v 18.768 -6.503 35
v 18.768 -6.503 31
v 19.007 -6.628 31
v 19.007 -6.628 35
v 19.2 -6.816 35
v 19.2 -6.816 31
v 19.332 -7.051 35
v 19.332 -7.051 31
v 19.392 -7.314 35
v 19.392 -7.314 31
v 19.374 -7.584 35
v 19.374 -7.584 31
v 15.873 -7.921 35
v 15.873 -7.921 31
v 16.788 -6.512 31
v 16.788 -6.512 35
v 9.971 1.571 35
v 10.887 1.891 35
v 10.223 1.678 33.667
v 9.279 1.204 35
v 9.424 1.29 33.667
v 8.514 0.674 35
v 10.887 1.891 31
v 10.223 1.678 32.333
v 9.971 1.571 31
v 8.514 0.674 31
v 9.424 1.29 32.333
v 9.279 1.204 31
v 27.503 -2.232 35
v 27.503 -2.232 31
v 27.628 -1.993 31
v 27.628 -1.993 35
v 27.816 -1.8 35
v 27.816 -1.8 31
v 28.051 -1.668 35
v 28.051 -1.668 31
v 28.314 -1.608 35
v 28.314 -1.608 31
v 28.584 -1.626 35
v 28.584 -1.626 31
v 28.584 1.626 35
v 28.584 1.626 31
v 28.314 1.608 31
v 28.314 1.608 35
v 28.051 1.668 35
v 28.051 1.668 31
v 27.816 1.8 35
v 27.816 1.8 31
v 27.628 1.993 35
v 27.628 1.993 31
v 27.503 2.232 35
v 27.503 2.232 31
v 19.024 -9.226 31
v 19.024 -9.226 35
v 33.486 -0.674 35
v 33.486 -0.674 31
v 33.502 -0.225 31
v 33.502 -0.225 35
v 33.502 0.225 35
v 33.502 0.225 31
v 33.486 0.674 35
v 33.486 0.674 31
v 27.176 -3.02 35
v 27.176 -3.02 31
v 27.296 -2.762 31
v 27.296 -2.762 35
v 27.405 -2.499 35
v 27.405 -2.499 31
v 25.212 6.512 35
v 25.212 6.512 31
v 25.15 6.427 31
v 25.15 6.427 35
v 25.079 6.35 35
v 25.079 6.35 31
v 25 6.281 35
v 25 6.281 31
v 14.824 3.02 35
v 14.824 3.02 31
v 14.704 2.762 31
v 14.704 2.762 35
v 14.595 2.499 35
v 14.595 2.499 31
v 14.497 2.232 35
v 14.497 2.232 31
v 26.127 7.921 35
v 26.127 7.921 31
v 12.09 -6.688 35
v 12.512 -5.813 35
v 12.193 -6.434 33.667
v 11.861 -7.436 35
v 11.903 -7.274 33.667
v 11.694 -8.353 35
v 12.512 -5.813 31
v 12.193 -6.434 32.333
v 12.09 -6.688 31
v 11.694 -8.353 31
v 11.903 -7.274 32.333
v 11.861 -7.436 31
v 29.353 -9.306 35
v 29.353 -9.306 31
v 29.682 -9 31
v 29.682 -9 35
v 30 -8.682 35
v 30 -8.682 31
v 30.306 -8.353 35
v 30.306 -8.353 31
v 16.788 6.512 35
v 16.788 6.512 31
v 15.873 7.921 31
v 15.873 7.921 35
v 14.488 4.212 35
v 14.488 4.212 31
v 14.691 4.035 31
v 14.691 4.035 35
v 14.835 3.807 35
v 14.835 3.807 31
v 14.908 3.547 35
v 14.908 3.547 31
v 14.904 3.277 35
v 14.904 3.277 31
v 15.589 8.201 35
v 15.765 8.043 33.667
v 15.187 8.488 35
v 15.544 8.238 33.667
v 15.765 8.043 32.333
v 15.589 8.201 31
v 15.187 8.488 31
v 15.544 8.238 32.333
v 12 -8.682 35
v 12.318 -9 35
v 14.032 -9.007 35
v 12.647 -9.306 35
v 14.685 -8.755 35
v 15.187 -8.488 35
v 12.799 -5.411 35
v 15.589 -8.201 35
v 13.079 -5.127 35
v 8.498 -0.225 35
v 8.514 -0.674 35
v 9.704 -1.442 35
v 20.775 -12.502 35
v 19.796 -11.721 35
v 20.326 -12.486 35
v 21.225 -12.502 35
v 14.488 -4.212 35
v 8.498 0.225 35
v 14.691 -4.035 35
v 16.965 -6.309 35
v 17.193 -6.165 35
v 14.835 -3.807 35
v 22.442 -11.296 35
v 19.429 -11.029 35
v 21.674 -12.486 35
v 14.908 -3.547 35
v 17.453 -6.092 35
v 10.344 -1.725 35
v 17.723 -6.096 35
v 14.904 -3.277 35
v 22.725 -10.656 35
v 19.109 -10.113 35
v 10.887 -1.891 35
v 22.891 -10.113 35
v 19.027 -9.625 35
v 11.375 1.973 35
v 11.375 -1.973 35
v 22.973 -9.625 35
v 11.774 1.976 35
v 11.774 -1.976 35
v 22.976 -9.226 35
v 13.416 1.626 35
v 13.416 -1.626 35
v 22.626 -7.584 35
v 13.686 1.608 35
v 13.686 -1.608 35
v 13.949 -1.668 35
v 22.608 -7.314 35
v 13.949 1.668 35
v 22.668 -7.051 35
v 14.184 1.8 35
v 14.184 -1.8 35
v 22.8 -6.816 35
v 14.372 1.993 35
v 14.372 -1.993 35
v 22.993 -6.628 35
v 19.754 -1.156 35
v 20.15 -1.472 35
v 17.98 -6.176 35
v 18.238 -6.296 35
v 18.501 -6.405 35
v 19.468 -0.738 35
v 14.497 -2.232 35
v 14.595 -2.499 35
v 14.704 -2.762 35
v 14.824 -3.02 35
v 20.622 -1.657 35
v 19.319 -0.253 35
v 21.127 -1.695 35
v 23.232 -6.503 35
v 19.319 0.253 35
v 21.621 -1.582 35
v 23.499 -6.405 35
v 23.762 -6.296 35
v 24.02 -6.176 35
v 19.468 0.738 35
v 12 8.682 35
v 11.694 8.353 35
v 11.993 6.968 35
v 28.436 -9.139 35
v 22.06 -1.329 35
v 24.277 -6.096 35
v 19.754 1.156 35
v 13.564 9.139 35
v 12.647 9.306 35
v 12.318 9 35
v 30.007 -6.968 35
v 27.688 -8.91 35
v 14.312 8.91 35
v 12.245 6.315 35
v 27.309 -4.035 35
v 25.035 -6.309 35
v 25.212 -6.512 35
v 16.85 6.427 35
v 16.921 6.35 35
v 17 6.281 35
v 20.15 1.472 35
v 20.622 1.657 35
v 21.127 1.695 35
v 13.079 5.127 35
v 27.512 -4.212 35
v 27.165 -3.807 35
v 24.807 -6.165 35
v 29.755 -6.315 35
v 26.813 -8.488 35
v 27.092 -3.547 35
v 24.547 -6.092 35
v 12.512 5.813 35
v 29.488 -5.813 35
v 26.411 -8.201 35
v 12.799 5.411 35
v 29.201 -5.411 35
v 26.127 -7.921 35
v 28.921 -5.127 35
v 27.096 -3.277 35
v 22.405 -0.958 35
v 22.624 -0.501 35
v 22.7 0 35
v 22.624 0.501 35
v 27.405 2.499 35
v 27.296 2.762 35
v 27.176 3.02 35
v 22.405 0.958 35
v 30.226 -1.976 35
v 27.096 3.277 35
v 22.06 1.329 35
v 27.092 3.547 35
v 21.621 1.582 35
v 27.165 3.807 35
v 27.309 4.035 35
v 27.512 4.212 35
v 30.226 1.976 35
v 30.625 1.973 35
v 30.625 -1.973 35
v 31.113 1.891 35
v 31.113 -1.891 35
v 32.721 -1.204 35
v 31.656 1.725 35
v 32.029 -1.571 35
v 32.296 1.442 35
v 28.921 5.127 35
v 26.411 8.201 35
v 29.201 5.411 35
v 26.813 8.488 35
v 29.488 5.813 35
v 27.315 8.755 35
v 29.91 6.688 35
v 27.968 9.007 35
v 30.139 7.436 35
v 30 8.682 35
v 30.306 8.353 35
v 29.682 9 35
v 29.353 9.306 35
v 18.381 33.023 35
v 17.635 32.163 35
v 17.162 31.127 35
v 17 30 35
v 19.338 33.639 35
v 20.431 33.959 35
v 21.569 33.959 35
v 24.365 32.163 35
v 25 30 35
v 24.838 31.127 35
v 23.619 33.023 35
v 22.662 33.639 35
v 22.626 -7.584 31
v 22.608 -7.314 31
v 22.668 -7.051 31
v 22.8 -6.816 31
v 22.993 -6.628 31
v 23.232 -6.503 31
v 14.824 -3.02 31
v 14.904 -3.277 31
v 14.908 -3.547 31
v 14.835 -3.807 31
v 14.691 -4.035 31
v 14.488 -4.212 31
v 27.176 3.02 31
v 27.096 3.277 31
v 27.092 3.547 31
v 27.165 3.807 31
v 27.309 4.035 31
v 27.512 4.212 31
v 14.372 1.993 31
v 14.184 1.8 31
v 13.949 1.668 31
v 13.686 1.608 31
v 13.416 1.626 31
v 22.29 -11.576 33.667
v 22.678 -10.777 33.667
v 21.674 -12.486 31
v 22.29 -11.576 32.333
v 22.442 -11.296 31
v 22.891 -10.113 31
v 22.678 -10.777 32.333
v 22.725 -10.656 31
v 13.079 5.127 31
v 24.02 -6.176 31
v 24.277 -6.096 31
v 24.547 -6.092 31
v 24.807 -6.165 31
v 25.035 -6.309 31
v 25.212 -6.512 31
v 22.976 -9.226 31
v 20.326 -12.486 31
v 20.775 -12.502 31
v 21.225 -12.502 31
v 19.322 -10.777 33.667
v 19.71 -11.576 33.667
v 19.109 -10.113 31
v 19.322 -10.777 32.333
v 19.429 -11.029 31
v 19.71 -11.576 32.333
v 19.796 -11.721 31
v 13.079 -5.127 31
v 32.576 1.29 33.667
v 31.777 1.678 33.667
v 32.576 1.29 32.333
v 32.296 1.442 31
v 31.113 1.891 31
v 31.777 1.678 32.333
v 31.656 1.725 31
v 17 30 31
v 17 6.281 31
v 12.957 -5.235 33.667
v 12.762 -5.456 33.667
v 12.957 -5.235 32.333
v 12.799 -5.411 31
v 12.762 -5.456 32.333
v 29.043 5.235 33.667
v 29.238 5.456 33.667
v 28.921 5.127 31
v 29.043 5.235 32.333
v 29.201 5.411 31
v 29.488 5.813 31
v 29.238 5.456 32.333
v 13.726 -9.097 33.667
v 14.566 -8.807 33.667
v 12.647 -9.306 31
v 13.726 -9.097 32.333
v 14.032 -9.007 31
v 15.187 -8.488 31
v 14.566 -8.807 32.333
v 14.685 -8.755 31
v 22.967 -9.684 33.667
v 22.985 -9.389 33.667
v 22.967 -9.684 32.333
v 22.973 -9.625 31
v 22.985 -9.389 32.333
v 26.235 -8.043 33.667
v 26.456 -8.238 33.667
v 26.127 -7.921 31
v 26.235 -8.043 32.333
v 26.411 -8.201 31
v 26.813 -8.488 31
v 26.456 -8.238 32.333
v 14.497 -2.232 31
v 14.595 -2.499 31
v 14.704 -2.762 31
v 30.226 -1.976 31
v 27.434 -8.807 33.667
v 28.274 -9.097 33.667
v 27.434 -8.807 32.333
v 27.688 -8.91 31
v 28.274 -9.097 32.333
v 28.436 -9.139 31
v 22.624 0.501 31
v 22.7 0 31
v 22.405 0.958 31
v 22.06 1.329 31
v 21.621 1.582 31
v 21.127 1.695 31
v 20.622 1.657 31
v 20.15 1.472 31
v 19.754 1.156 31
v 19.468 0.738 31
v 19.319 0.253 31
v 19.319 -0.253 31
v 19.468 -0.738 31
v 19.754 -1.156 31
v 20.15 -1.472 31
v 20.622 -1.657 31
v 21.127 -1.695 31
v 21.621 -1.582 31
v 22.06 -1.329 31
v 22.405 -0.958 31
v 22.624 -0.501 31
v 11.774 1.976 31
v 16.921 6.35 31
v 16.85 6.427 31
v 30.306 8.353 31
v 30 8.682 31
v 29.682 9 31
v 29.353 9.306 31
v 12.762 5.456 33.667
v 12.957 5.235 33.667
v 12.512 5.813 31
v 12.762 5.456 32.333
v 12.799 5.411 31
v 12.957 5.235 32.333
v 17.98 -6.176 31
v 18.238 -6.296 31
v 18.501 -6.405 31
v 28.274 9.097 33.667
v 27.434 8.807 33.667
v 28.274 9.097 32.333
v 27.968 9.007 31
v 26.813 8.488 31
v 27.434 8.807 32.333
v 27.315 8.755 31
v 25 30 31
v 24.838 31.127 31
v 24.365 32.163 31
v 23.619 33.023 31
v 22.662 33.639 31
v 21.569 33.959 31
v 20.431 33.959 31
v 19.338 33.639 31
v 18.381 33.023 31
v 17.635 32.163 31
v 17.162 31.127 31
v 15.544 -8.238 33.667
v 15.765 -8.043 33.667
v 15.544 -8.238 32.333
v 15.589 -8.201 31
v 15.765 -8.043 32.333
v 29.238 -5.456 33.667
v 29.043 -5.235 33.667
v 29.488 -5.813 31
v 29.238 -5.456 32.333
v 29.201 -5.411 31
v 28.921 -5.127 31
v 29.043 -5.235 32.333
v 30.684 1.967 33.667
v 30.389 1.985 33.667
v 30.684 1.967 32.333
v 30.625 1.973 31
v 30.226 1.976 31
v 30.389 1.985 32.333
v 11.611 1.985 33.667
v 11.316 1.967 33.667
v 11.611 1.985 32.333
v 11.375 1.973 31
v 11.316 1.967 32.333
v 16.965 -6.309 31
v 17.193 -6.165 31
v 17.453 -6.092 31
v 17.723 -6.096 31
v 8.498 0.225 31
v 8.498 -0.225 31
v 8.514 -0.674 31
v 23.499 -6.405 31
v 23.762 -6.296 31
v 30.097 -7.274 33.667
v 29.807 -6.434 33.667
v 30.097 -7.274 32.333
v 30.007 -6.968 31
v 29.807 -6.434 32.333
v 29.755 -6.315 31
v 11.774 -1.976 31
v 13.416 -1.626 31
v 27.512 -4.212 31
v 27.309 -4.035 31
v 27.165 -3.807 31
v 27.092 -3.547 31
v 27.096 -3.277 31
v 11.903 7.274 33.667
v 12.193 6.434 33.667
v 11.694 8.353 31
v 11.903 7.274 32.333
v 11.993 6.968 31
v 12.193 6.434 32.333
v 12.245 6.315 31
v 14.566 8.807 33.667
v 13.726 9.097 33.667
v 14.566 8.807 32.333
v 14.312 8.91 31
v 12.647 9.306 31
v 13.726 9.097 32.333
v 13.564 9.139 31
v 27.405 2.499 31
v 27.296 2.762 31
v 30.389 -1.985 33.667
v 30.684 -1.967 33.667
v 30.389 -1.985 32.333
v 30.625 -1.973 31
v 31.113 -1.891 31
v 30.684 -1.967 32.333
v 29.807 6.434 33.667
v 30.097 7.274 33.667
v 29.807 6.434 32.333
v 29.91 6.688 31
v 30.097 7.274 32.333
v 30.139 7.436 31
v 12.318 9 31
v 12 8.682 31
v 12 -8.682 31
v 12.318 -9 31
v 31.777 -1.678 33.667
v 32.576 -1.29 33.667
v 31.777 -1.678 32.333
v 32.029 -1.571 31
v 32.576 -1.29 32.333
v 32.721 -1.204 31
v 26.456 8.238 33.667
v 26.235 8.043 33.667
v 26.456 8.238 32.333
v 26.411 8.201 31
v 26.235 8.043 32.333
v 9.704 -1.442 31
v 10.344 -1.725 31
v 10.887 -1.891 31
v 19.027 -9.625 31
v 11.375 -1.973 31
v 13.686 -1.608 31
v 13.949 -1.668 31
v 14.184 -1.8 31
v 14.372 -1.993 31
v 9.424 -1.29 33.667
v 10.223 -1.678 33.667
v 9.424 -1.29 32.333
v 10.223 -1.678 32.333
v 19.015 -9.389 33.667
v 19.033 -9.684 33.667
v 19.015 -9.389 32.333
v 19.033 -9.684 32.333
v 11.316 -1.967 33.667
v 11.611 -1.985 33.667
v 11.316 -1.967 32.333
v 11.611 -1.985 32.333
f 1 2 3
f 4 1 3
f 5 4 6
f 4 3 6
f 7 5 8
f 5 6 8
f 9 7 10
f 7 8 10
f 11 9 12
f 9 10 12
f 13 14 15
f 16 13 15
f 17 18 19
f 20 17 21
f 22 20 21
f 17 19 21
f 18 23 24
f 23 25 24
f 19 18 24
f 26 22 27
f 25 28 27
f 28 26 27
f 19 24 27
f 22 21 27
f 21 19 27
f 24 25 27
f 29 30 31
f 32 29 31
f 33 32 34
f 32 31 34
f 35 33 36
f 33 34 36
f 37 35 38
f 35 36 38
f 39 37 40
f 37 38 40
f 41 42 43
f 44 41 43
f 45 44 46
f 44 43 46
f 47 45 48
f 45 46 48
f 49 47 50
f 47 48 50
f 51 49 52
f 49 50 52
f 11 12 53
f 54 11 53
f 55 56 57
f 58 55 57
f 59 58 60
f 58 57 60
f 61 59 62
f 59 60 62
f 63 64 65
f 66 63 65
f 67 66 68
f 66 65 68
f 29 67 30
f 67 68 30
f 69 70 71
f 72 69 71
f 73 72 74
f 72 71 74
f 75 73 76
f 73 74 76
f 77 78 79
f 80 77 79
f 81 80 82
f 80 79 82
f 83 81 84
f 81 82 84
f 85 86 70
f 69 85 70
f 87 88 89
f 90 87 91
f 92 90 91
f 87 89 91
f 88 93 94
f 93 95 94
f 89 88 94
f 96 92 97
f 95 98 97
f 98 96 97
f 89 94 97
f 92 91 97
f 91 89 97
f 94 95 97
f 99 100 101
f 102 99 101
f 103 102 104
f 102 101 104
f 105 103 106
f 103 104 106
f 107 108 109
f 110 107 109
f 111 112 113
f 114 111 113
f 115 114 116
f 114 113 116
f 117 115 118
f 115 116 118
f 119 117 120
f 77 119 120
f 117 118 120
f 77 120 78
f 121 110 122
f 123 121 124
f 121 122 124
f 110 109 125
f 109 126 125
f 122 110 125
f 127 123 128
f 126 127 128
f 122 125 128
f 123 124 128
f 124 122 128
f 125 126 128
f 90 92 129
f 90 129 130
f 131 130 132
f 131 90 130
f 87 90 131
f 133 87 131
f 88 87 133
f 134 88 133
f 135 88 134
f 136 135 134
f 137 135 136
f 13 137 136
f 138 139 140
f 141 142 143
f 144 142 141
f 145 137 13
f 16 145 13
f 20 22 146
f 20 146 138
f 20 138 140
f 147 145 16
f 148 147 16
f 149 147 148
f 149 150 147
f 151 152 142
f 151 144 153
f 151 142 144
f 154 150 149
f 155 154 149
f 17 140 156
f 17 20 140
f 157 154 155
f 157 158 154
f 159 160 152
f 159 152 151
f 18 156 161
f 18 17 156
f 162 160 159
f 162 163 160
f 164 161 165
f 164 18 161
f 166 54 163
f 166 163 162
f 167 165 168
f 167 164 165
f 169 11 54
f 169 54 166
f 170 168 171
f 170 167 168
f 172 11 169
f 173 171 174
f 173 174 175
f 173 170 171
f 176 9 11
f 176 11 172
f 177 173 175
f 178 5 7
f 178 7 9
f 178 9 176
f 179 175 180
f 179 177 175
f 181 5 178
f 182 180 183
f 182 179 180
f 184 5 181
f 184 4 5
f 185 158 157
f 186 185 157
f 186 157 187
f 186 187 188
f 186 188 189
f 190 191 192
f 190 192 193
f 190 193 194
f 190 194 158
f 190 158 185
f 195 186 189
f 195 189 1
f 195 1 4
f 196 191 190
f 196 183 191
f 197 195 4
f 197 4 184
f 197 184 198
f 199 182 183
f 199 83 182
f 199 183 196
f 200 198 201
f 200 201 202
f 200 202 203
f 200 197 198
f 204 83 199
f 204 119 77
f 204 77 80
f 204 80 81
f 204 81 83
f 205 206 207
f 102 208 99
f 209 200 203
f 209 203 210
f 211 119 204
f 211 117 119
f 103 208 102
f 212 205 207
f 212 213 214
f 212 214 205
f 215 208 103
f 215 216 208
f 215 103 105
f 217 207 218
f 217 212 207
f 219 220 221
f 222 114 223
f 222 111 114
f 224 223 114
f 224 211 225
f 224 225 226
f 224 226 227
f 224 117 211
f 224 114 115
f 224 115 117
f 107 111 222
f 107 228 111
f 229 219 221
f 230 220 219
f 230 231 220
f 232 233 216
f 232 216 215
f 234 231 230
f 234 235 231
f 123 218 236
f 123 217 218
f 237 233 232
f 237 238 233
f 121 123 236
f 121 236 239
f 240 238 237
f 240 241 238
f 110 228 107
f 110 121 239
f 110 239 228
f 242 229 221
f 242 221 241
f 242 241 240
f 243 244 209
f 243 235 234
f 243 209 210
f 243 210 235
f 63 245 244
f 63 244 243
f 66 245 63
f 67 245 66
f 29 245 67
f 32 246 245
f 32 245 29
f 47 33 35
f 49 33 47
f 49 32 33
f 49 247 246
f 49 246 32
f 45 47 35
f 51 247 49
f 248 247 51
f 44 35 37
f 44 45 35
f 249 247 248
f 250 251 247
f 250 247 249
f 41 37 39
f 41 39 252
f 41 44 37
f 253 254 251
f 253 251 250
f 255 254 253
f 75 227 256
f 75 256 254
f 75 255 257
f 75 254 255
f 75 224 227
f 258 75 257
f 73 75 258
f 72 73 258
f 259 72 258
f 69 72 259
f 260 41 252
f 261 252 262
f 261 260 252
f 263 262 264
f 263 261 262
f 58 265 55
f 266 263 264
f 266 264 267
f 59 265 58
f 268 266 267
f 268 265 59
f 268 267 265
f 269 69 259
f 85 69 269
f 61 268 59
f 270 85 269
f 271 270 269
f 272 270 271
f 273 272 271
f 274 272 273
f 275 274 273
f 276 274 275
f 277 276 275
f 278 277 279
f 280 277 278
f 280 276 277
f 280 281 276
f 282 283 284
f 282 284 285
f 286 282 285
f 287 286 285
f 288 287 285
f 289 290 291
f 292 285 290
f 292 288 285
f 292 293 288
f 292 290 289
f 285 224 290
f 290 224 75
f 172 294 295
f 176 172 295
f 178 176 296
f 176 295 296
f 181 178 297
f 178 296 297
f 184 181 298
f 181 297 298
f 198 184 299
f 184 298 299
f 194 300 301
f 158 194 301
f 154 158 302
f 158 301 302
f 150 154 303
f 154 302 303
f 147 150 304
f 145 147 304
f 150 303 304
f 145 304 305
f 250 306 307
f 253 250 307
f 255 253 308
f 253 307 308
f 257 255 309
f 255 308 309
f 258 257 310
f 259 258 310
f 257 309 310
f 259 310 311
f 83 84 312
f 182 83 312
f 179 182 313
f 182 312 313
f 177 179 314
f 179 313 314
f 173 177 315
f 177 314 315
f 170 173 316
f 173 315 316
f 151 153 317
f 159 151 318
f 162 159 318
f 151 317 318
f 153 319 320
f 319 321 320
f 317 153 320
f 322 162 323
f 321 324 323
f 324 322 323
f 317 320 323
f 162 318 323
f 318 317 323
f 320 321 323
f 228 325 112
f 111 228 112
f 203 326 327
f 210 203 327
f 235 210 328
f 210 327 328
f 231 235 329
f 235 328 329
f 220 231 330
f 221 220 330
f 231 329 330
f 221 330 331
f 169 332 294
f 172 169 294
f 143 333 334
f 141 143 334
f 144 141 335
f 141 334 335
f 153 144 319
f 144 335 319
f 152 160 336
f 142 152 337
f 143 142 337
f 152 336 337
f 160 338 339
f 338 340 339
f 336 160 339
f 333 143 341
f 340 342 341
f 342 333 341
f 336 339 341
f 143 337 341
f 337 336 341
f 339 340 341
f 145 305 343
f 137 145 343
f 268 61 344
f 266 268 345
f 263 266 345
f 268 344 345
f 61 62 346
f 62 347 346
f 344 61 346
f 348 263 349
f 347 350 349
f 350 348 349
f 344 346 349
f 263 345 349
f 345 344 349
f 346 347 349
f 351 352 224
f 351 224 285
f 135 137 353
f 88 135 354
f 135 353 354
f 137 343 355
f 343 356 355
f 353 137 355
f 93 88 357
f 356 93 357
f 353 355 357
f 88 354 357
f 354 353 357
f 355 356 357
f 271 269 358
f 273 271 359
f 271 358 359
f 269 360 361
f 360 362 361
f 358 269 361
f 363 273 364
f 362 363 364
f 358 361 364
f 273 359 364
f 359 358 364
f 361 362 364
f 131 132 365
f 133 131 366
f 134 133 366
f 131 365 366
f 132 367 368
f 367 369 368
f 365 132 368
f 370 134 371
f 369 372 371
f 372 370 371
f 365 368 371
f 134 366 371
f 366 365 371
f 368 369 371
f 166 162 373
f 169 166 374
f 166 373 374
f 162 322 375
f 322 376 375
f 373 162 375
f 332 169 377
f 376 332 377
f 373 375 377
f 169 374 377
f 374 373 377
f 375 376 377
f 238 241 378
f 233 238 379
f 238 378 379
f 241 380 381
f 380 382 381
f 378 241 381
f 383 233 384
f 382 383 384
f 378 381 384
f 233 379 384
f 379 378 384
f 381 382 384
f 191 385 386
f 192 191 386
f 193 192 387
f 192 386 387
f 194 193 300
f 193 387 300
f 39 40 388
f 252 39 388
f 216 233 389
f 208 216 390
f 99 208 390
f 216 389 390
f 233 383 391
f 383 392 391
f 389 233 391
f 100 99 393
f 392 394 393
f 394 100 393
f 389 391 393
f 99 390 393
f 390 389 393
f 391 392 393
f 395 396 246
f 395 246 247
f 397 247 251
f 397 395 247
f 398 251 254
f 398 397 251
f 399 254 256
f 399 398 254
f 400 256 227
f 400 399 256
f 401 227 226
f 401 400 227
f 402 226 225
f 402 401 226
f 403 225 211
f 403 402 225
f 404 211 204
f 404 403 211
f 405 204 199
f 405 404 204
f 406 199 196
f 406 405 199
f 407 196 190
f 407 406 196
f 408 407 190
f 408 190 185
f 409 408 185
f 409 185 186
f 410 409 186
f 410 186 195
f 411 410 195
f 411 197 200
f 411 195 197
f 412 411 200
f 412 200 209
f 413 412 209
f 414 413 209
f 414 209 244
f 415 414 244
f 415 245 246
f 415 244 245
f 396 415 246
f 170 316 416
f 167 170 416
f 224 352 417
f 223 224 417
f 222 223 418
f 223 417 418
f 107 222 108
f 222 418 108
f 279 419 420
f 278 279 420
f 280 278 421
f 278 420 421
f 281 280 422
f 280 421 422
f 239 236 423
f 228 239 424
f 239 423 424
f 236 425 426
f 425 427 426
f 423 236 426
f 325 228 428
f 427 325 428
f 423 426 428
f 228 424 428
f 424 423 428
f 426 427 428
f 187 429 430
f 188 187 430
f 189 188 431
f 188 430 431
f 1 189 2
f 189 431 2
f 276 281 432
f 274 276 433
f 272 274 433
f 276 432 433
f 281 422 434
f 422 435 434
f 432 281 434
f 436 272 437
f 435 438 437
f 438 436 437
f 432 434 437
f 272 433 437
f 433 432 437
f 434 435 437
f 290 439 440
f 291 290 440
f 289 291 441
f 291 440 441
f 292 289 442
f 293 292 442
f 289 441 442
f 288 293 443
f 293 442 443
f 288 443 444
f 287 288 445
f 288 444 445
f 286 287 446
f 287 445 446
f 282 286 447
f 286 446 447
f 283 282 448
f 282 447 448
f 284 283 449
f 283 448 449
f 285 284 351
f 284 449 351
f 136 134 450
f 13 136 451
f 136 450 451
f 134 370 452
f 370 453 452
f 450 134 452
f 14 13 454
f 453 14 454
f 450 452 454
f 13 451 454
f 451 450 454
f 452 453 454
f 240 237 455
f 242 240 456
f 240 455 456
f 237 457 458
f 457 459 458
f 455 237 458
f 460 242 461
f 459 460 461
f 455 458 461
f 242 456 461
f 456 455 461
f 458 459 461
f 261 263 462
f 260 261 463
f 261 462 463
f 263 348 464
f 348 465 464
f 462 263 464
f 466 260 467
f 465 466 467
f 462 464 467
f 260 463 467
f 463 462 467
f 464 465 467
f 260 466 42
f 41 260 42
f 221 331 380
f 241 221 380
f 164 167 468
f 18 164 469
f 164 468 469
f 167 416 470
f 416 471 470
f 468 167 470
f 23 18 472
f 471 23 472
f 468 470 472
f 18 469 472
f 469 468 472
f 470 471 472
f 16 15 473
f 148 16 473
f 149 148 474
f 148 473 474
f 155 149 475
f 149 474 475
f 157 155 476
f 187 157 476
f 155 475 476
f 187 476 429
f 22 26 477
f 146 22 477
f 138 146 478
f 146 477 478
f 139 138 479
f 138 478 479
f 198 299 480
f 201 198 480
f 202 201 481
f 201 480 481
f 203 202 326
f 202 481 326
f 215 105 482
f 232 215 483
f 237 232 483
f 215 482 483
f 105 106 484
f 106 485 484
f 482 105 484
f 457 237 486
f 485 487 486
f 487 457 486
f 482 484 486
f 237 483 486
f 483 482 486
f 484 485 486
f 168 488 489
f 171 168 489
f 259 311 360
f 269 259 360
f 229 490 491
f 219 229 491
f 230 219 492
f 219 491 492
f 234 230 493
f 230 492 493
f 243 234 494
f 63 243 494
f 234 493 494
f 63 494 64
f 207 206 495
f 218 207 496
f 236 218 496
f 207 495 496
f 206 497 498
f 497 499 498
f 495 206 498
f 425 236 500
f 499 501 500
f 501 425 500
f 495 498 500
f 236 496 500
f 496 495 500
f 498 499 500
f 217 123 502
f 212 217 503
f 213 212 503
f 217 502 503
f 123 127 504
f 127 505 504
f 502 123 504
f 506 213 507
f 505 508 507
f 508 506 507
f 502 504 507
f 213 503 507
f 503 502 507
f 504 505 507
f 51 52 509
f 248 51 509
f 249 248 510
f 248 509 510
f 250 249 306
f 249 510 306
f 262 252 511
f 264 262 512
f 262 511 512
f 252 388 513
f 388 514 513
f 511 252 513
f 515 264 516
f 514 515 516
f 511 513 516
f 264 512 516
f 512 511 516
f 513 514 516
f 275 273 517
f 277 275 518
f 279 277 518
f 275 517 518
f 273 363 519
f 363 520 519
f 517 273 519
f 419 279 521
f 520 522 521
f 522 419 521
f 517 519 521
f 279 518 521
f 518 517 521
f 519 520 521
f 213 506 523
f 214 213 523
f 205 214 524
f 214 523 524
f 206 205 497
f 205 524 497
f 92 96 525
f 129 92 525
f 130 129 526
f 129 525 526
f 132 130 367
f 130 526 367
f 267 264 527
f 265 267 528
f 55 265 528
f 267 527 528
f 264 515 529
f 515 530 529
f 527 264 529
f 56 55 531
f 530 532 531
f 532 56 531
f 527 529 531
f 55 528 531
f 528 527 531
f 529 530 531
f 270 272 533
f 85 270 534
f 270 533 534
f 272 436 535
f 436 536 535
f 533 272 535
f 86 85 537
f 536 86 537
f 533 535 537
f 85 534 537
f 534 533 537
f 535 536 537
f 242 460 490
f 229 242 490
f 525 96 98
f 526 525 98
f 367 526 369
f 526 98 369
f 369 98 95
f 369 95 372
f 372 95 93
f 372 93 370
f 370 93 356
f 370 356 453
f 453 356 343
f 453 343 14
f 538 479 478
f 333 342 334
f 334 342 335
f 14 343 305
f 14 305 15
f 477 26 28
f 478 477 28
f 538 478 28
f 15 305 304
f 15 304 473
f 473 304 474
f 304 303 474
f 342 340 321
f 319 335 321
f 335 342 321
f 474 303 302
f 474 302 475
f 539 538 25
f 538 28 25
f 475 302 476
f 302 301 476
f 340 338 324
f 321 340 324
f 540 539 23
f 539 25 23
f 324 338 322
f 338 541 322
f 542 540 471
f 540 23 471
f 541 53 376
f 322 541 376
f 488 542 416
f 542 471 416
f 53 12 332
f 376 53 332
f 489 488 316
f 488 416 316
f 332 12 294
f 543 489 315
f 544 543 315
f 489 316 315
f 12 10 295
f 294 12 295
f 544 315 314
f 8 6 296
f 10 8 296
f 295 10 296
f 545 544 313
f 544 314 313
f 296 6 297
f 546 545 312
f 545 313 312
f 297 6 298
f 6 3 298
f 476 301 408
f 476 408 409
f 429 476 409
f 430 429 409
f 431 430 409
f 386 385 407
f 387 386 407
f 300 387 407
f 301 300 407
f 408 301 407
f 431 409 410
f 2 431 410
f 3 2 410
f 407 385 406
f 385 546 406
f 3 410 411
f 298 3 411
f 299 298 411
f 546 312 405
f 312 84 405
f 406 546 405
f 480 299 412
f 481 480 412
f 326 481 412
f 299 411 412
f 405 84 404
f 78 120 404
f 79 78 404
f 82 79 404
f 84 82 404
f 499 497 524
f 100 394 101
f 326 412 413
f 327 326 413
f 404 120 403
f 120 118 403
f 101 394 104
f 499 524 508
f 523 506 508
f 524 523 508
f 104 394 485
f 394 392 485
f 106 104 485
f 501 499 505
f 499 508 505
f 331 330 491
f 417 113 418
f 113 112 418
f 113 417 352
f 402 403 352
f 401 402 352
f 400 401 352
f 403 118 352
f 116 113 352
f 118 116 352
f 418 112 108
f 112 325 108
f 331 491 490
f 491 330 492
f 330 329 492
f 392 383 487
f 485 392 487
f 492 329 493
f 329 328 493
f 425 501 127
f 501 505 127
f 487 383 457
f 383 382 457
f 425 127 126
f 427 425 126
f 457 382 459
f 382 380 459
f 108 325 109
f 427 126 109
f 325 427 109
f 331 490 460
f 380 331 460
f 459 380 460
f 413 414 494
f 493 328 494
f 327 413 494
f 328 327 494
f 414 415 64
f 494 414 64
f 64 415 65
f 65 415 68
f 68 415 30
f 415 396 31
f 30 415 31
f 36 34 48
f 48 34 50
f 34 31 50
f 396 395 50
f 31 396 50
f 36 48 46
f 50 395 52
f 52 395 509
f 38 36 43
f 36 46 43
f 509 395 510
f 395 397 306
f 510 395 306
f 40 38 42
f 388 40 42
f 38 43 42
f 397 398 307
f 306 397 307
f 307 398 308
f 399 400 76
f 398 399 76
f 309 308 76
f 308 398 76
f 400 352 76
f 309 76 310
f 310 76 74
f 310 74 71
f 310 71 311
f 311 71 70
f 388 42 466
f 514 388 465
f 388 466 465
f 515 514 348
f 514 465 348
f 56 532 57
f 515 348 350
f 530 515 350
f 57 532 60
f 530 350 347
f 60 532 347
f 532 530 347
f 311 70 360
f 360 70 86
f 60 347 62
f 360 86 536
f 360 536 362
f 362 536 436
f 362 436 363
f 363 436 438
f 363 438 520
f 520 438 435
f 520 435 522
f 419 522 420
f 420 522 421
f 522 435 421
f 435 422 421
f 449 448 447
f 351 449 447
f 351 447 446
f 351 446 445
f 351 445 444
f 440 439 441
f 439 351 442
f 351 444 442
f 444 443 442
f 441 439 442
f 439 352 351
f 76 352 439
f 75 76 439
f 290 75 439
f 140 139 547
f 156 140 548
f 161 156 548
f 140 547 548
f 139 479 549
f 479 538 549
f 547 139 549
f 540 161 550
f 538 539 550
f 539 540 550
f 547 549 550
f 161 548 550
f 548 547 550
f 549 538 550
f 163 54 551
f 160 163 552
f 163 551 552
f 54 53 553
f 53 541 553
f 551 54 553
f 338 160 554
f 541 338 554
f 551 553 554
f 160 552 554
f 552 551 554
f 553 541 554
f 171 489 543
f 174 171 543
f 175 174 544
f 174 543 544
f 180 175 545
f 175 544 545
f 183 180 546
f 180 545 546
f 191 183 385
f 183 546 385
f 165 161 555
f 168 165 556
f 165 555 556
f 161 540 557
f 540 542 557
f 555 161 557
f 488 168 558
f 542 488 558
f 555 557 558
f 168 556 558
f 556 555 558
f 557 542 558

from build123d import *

# Parameters (mm, degrees)
CYLINDER008_R     = 1.7
CYLINDER008_DEPTH = 10
EXTRUDE019_DEPTH  = 4
EXTRUDE021_DEPTH  = 4


with BuildPart() as cylinder008:
    # Cylinder008 → Cylinder008 (new body)
    with BuildSketch(Plane(origin=(21, 0, -4), x_dir=(1, 0, 0), z_dir=(0, 0, 1))):
        Circle(CYLINDER008_R)
    extrude(amount=CYLINDER008_DEPTH)


with BuildPart() as extrude019:
    # InvoluteGear006 → Extrude019 (new body)
    with BuildSketch(Plane.XY):
        with BuildLine():
            Line((7.583619, -1.626335), (9.226112, -1.976129))
            add(Edge.make_bspline(
                [(9.226112, -1.976129), (9.323588, -1.988042), (9.615448, -2.006593), (10.112858, -1.891348)],
                knots=[0, 0, 0, 0, 1, 1, 1, 1], degree=3))
            add(Edge.make_bspline(
                [(10.112858, -1.891348), (10.701098, -1.749257), (11.528547, -1.419904), (12.486309, -0.674071)],
                knots=[0, 0, 0, 0, 1, 1, 1, 1], degree=3))
            ThreePointArc((12.486309, -0.674071), (12.504498, 0), (12.486309, 0.674071))
            add(Edge.make_bspline(
                [(12.486309, 0.674071), (11.528547, 1.419904), (10.701098, 1.749257), (10.112858, 1.891348)],
                knots=[0, 0, 0, 0, 1, 1, 1, 1], degree=3))
            add(Edge.make_bspline(
                [(10.112858, 1.891348), (9.615448, 2.006593), (9.323588, 1.988042), (9.226112, 1.976129)],
                knots=[0, 0, 0, 0, 1, 1, 1, 1], degree=3))
            Line((9.226112, 1.976129), (7.583619, 1.626335))
            ThreePointArc((7.583619, 1.626335), (6.928673, 1.725171), (6.502518, 2.232237))
            ThreePointArc((6.502518, 2.232237), (6.351672, 2.630949), (6.176404, 3.019545))
            ThreePointArc((6.176404, 3.019545), (6.119192, 3.679432), (6.512421, 4.212436))
            Line((6.512421, 4.212436), (7.92118, 5.126512))
            add(Edge.make_bspline(
                [(7.92118, 5.126512), (7.99853, 5.187015), (8.218024, 5.380273), (8.488255, 5.813485)],
                knots=[0, 0, 0, 0, 1, 1, 1, 1], degree=3))
            add(Edge.make_bspline(
                [(8.488255, 5.813485), (8.803731, 6.329908), (9.155937, 7.14789), (9.305795, 8.352514)],
                knots=[0, 0, 0, 0, 1, 1, 1, 1], degree=3))
            ThreePointArc((9.305795, 8.352514), (8.842015, 8.842015), (8.352514, 9.305795))
            add(Edge.make_bspline(
                [(8.352514, 9.305795), (7.14789, 9.155937), (6.329908, 8.803731), (5.813485, 8.488255)],
                knots=[0, 0, 0, 0, 1, 1, 1, 1], degree=3))
            add(Edge.make_bspline(
                [(5.813485, 8.488255), (5.380273, 8.218024), (5.187015, 7.99853), (5.126512, 7.92118)],
                knots=[0, 0, 0, 0, 1, 1, 1, 1], degree=3))
            Line((5.126512, 7.92118), (4.212436, 6.512421))
            ThreePointArc((4.212436, 6.512421), (3.679432, 6.119192), (3.019545, 6.176404))
            ThreePointArc((3.019545, 6.176404), (2.630949, 6.351672), (2.232237, 6.502518))
            ThreePointArc((2.232237, 6.502518), (1.725171, 6.928673), (1.626335, 7.583619))
            Line((1.626335, 7.583619), (1.976129, 9.226112))
            add(Edge.make_bspline(
                [(1.976129, 9.226112), (1.988042, 9.323588), (2.006593, 9.615448), (1.891348, 10.112858)],
                knots=[0, 0, 0, 0, 1, 1, 1, 1], degree=3))
            add(Edge.make_bspline(
                [(1.891348, 10.112858), (1.749257, 10.701098), (1.419904, 11.528547), (0.674071, 12.486309)],
                knots=[0, 0, 0, 0, 1, 1, 1, 1], degree=3))
            ThreePointArc((0.674071, 12.486309), (0, 12.504498), (-0.674071, 12.486309))
            add(Edge.make_bspline(
                [(-0.674071, 12.486309), (-1.419904, 11.528547), (-1.749257, 10.701098), (-1.891348, 10.112858)],
                knots=[0, 0, 0, 0, 1, 1, 1, 1], degree=3))
            add(Edge.make_bspline(
                [(-1.891348, 10.112858), (-2.006593, 9.615448), (-1.988042, 9.323588), (-1.976129, 9.226112)],
                knots=[0, 0, 0, 0, 1, 1, 1, 1], degree=3))
            Line((-1.976129, 9.226112), (-1.626335, 7.583619))
            ThreePointArc((-1.626335, 7.583619), (-1.725171, 6.928673), (-2.232237, 6.502518))
            ThreePointArc((-2.232237, 6.502518), (-2.630949, 6.351672), (-3.019545, 6.176404))
            ThreePointArc((-3.019545, 6.176404), (-3.679432, 6.119192), (-4.212436, 6.512421))
            Line((-4.212436, 6.512421), (-5.126512, 7.92118))
            add(Edge.make_bspline(
                [(-5.126512, 7.92118), (-5.187015, 7.99853), (-5.380273, 8.218024), (-5.813485, 8.488255)],
                knots=[0, 0, 0, 0, 1, 1, 1, 1], degree=3))
            add(Edge.make_bspline(
                [(-5.813485, 8.488255), (-6.329908, 8.803731), (-7.14789, 9.155937), (-8.352514, 9.305795)],
                knots=[0, 0, 0, 0, 1, 1, 1, 1], degree=3))
            ThreePointArc((-8.352514, 9.305795), (-8.842015, 8.842015), (-9.305795, 8.352514))
            add(Edge.make_bspline(
                [(-9.305795, 8.352514), (-9.155937, 7.14789), (-8.803731, 6.329908), (-8.488255, 5.813485)],
                knots=[0, 0, 0, 0, 1, 1, 1, 1], degree=3))
            add(Edge.make_bspline(
                [(-8.488255, 5.813485), (-8.218024, 5.380273), (-7.99853, 5.187015), (-7.92118, 5.126512)],
                knots=[0, 0, 0, 0, 1, 1, 1, 1], degree=3))
            Line((-7.92118, 5.126512), (-6.512421, 4.212436))
            ThreePointArc((-6.512421, 4.212436), (-6.119192, 3.679432), (-6.176404, 3.019545))
            ThreePointArc((-6.176404, 3.019545), (-6.351672, 2.630949), (-6.502518, 2.232237))
            ThreePointArc((-6.502518, 2.232237), (-6.928673, 1.725171), (-7.583619, 1.626335))
            Line((-7.583619, 1.626335), (-9.226112, 1.976129))
            add(Edge.make_bspline(
                [(-9.226112, 1.976129), (-9.323588, 1.988042), (-9.615448, 2.006593), (-10.112858, 1.891348)],
                knots=[0, 0, 0, 0, 1, 1, 1, 1], degree=3))
            add(Edge.make_bspline(
                [(-10.112858, 1.891348), (-10.701098, 1.749257), (-11.528547, 1.419904), (-12.486309, 0.674071)],
                knots=[0, 0, 0, 0, 1, 1, 1, 1], degree=3))
            ThreePointArc((-12.486309, 0.674071), (-12.504498, 0), (-12.486309, -0.674071))
            add(Edge.make_bspline(
                [(-12.486309, -0.674071), (-11.528547, -1.419904), (-10.701098, -1.749257), (-10.112858, -1.891348)],
                knots=[0, 0, 0, 0, 1, 1, 1, 1], degree=3))
            add(Edge.make_bspline(
                [(-10.112858, -1.891348), (-9.615448, -2.006593), (-9.323588, -1.988042), (-9.226112, -1.976129)],
                knots=[0, 0, 0, 0, 1, 1, 1, 1], degree=3))
            Line((-9.226112, -1.976129), (-7.583619, -1.626335))
            ThreePointArc((-7.583619, -1.626335), (-6.928673, -1.725171), (-6.502518, -2.232237))
            ThreePointArc((-6.502518, -2.232237), (-6.351672, -2.630949), (-6.176404, -3.019545))
            ThreePointArc((-6.176404, -3.019545), (-6.119192, -3.679432), (-6.512421, -4.212436))
            Line((-6.512421, -4.212436), (-7.92118, -5.126512))
            add(Edge.make_bspline(
                [(-7.92118, -5.126512), (-7.99853, -5.187015), (-8.218024, -5.380273), (-8.488255, -5.813485)],
                knots=[0, 0, 0, 0, 1, 1, 1, 1], degree=3))
            add(Edge.make_bspline(
                [(-8.488255, -5.813485), (-8.803731, -6.329908), (-9.155937, -7.14789), (-9.305795, -8.352514)],
                knots=[0, 0, 0, 0, 1, 1, 1, 1], degree=3))
            ThreePointArc((-9.305795, -8.352514), (-8.842015, -8.842015), (-8.352514, -9.305795))
            add(Edge.make_bspline(
                [(-8.352514, -9.305795), (-7.14789, -9.155937), (-6.329908, -8.803731), (-5.813485, -8.488255)],
                knots=[0, 0, 0, 0, 1, 1, 1, 1], degree=3))
            add(Edge.make_bspline(
                [(-5.813485, -8.488255), (-5.380273, -8.218024), (-5.187015, -7.99853), (-5.126512, -7.92118)],
                knots=[0, 0, 0, 0, 1, 1, 1, 1], degree=3))
            Line((-5.126512, -7.92118), (-4.212436, -6.512421))
            ThreePointArc((-4.212436, -6.512421), (-3.679432, -6.119192), (-3.019545, -6.176404))
            ThreePointArc((-3.019545, -6.176404), (-2.630949, -6.351672), (-2.232237, -6.502518))
            ThreePointArc((-2.232237, -6.502518), (-1.725171, -6.928673), (-1.626335, -7.583619))
            Line((-1.626335, -7.583619), (-1.976129, -9.226112))
            add(Edge.make_bspline(
                [(-1.976129, -9.226112), (-1.988042, -9.323588), (-2.006593, -9.615448), (-1.891348, -10.112858)],
                knots=[0, 0, 0, 0, 1, 1, 1, 1], degree=3))
            add(Edge.make_bspline(
                [(-1.891348, -10.112858), (-1.749257, -10.701098), (-1.419904, -11.528547), (-0.674071, -12.486309)],
                knots=[0, 0, 0, 0, 1, 1, 1, 1], degree=3))
            ThreePointArc((-0.674071, -12.486309), (0, -12.504498), (0.674071, -12.486309))
            add(Edge.make_bspline(
                [(0.674071, -12.486309), (1.419904, -11.528547), (1.749257, -10.701098), (1.891348, -10.112858)],
                knots=[0, 0, 0, 0, 1, 1, 1, 1], degree=3))
            add(Edge.make_bspline(
                [(1.891348, -10.112858), (2.006593, -9.615448), (1.988042, -9.323588), (1.976129, -9.226112)],
                knots=[0, 0, 0, 0, 1, 1, 1, 1], degree=3))
            Line((1.976129, -9.226112), (1.626335, -7.583619))
            ThreePointArc((1.626335, -7.583619), (1.725171, -6.928673), (2.232237, -6.502518))
            ThreePointArc((2.232237, -6.502518), (2.630949, -6.351672), (3.019545, -6.176404))
            ThreePointArc((3.019545, -6.176404), (3.679432, -6.119192), (4.212436, -6.512421))
            Line((4.212436, -6.512421), (5.126512, -7.92118))
            add(Edge.make_bspline(
                [(5.126512, -7.92118), (5.187015, -7.99853), (5.380273, -8.218024), (5.813485, -8.488255)],
                knots=[0, 0, 0, 0, 1, 1, 1, 1], degree=3))
            add(Edge.make_bspline(
                [(5.813485, -8.488255), (6.329908, -8.803731), (7.14789, -9.155937), (8.352514, -9.305795)],
                knots=[0, 0, 0, 0, 1, 1, 1, 1], degree=3))
            ThreePointArc((8.352514, -9.305795), (8.842015, -8.842015), (9.305795, -8.352514))
            add(Edge.make_bspline(
                [(9.305795, -8.352514), (9.155937, -7.14789), (8.803731, -6.329908), (8.488255, -5.813485)],
                knots=[0, 0, 0, 0, 1, 1, 1, 1], degree=3))
            add(Edge.make_bspline(
                [(8.488255, -5.813485), (8.218024, -5.380273), (7.99853, -5.187015), (7.92118, -5.126512)],
                knots=[0, 0, 0, 0, 1, 1, 1, 1], degree=3))
            Line((7.92118, -5.126512), (6.512421, -4.212436))
            ThreePointArc((6.512421, -4.212436), (6.119192, -3.679432), (6.176404, -3.019545))
            ThreePointArc((6.176404, -3.019545), (6.351672, -2.630949), (6.502518, -2.232237))
            ThreePointArc((6.502518, -2.232237), (6.928673, -1.725171), (7.583619, -1.626335))
        make_face()
    extrude(amount=EXTRUDE019_DEPTH)


with BuildPart() as extrude019_1:
    # Extrude019 placement: moved
    add(extrude019.part.moved(Location((21, 0, 0))))


with BuildPart() as cut007:
    # Sketch012 → Extrude021 (new body)
    with BuildSketch(Plane.XY):
        with BuildLine():
            ThreePointArc((-4, 0), (0, -4), (4, 0))
            Line((4, 0), (4, 30))
            ThreePointArc((4, 30), (0, 34), (-4, 30))
            Line((-4, 0), (-4, 30))
        make_face()
    extrude(amount=EXTRUDE021_DEPTH)


with BuildPart() as cut007_1:
    # Extrude021 placement: moved
    add(cut007.part.moved(Location((21, 0, 0))))

    # Fusion005: union Extrude019
    add(extrude019_1.part)

    # Cut007: cut Cylinder008
    add(cylinder008.part, mode=Mode.SUBTRACT)


with BuildPart() as cut007_2:
    # Cut007 placement: moved
    add(cut007_1.part.moved(Location((0, 0, 31))))


solid = cut007_2.part
